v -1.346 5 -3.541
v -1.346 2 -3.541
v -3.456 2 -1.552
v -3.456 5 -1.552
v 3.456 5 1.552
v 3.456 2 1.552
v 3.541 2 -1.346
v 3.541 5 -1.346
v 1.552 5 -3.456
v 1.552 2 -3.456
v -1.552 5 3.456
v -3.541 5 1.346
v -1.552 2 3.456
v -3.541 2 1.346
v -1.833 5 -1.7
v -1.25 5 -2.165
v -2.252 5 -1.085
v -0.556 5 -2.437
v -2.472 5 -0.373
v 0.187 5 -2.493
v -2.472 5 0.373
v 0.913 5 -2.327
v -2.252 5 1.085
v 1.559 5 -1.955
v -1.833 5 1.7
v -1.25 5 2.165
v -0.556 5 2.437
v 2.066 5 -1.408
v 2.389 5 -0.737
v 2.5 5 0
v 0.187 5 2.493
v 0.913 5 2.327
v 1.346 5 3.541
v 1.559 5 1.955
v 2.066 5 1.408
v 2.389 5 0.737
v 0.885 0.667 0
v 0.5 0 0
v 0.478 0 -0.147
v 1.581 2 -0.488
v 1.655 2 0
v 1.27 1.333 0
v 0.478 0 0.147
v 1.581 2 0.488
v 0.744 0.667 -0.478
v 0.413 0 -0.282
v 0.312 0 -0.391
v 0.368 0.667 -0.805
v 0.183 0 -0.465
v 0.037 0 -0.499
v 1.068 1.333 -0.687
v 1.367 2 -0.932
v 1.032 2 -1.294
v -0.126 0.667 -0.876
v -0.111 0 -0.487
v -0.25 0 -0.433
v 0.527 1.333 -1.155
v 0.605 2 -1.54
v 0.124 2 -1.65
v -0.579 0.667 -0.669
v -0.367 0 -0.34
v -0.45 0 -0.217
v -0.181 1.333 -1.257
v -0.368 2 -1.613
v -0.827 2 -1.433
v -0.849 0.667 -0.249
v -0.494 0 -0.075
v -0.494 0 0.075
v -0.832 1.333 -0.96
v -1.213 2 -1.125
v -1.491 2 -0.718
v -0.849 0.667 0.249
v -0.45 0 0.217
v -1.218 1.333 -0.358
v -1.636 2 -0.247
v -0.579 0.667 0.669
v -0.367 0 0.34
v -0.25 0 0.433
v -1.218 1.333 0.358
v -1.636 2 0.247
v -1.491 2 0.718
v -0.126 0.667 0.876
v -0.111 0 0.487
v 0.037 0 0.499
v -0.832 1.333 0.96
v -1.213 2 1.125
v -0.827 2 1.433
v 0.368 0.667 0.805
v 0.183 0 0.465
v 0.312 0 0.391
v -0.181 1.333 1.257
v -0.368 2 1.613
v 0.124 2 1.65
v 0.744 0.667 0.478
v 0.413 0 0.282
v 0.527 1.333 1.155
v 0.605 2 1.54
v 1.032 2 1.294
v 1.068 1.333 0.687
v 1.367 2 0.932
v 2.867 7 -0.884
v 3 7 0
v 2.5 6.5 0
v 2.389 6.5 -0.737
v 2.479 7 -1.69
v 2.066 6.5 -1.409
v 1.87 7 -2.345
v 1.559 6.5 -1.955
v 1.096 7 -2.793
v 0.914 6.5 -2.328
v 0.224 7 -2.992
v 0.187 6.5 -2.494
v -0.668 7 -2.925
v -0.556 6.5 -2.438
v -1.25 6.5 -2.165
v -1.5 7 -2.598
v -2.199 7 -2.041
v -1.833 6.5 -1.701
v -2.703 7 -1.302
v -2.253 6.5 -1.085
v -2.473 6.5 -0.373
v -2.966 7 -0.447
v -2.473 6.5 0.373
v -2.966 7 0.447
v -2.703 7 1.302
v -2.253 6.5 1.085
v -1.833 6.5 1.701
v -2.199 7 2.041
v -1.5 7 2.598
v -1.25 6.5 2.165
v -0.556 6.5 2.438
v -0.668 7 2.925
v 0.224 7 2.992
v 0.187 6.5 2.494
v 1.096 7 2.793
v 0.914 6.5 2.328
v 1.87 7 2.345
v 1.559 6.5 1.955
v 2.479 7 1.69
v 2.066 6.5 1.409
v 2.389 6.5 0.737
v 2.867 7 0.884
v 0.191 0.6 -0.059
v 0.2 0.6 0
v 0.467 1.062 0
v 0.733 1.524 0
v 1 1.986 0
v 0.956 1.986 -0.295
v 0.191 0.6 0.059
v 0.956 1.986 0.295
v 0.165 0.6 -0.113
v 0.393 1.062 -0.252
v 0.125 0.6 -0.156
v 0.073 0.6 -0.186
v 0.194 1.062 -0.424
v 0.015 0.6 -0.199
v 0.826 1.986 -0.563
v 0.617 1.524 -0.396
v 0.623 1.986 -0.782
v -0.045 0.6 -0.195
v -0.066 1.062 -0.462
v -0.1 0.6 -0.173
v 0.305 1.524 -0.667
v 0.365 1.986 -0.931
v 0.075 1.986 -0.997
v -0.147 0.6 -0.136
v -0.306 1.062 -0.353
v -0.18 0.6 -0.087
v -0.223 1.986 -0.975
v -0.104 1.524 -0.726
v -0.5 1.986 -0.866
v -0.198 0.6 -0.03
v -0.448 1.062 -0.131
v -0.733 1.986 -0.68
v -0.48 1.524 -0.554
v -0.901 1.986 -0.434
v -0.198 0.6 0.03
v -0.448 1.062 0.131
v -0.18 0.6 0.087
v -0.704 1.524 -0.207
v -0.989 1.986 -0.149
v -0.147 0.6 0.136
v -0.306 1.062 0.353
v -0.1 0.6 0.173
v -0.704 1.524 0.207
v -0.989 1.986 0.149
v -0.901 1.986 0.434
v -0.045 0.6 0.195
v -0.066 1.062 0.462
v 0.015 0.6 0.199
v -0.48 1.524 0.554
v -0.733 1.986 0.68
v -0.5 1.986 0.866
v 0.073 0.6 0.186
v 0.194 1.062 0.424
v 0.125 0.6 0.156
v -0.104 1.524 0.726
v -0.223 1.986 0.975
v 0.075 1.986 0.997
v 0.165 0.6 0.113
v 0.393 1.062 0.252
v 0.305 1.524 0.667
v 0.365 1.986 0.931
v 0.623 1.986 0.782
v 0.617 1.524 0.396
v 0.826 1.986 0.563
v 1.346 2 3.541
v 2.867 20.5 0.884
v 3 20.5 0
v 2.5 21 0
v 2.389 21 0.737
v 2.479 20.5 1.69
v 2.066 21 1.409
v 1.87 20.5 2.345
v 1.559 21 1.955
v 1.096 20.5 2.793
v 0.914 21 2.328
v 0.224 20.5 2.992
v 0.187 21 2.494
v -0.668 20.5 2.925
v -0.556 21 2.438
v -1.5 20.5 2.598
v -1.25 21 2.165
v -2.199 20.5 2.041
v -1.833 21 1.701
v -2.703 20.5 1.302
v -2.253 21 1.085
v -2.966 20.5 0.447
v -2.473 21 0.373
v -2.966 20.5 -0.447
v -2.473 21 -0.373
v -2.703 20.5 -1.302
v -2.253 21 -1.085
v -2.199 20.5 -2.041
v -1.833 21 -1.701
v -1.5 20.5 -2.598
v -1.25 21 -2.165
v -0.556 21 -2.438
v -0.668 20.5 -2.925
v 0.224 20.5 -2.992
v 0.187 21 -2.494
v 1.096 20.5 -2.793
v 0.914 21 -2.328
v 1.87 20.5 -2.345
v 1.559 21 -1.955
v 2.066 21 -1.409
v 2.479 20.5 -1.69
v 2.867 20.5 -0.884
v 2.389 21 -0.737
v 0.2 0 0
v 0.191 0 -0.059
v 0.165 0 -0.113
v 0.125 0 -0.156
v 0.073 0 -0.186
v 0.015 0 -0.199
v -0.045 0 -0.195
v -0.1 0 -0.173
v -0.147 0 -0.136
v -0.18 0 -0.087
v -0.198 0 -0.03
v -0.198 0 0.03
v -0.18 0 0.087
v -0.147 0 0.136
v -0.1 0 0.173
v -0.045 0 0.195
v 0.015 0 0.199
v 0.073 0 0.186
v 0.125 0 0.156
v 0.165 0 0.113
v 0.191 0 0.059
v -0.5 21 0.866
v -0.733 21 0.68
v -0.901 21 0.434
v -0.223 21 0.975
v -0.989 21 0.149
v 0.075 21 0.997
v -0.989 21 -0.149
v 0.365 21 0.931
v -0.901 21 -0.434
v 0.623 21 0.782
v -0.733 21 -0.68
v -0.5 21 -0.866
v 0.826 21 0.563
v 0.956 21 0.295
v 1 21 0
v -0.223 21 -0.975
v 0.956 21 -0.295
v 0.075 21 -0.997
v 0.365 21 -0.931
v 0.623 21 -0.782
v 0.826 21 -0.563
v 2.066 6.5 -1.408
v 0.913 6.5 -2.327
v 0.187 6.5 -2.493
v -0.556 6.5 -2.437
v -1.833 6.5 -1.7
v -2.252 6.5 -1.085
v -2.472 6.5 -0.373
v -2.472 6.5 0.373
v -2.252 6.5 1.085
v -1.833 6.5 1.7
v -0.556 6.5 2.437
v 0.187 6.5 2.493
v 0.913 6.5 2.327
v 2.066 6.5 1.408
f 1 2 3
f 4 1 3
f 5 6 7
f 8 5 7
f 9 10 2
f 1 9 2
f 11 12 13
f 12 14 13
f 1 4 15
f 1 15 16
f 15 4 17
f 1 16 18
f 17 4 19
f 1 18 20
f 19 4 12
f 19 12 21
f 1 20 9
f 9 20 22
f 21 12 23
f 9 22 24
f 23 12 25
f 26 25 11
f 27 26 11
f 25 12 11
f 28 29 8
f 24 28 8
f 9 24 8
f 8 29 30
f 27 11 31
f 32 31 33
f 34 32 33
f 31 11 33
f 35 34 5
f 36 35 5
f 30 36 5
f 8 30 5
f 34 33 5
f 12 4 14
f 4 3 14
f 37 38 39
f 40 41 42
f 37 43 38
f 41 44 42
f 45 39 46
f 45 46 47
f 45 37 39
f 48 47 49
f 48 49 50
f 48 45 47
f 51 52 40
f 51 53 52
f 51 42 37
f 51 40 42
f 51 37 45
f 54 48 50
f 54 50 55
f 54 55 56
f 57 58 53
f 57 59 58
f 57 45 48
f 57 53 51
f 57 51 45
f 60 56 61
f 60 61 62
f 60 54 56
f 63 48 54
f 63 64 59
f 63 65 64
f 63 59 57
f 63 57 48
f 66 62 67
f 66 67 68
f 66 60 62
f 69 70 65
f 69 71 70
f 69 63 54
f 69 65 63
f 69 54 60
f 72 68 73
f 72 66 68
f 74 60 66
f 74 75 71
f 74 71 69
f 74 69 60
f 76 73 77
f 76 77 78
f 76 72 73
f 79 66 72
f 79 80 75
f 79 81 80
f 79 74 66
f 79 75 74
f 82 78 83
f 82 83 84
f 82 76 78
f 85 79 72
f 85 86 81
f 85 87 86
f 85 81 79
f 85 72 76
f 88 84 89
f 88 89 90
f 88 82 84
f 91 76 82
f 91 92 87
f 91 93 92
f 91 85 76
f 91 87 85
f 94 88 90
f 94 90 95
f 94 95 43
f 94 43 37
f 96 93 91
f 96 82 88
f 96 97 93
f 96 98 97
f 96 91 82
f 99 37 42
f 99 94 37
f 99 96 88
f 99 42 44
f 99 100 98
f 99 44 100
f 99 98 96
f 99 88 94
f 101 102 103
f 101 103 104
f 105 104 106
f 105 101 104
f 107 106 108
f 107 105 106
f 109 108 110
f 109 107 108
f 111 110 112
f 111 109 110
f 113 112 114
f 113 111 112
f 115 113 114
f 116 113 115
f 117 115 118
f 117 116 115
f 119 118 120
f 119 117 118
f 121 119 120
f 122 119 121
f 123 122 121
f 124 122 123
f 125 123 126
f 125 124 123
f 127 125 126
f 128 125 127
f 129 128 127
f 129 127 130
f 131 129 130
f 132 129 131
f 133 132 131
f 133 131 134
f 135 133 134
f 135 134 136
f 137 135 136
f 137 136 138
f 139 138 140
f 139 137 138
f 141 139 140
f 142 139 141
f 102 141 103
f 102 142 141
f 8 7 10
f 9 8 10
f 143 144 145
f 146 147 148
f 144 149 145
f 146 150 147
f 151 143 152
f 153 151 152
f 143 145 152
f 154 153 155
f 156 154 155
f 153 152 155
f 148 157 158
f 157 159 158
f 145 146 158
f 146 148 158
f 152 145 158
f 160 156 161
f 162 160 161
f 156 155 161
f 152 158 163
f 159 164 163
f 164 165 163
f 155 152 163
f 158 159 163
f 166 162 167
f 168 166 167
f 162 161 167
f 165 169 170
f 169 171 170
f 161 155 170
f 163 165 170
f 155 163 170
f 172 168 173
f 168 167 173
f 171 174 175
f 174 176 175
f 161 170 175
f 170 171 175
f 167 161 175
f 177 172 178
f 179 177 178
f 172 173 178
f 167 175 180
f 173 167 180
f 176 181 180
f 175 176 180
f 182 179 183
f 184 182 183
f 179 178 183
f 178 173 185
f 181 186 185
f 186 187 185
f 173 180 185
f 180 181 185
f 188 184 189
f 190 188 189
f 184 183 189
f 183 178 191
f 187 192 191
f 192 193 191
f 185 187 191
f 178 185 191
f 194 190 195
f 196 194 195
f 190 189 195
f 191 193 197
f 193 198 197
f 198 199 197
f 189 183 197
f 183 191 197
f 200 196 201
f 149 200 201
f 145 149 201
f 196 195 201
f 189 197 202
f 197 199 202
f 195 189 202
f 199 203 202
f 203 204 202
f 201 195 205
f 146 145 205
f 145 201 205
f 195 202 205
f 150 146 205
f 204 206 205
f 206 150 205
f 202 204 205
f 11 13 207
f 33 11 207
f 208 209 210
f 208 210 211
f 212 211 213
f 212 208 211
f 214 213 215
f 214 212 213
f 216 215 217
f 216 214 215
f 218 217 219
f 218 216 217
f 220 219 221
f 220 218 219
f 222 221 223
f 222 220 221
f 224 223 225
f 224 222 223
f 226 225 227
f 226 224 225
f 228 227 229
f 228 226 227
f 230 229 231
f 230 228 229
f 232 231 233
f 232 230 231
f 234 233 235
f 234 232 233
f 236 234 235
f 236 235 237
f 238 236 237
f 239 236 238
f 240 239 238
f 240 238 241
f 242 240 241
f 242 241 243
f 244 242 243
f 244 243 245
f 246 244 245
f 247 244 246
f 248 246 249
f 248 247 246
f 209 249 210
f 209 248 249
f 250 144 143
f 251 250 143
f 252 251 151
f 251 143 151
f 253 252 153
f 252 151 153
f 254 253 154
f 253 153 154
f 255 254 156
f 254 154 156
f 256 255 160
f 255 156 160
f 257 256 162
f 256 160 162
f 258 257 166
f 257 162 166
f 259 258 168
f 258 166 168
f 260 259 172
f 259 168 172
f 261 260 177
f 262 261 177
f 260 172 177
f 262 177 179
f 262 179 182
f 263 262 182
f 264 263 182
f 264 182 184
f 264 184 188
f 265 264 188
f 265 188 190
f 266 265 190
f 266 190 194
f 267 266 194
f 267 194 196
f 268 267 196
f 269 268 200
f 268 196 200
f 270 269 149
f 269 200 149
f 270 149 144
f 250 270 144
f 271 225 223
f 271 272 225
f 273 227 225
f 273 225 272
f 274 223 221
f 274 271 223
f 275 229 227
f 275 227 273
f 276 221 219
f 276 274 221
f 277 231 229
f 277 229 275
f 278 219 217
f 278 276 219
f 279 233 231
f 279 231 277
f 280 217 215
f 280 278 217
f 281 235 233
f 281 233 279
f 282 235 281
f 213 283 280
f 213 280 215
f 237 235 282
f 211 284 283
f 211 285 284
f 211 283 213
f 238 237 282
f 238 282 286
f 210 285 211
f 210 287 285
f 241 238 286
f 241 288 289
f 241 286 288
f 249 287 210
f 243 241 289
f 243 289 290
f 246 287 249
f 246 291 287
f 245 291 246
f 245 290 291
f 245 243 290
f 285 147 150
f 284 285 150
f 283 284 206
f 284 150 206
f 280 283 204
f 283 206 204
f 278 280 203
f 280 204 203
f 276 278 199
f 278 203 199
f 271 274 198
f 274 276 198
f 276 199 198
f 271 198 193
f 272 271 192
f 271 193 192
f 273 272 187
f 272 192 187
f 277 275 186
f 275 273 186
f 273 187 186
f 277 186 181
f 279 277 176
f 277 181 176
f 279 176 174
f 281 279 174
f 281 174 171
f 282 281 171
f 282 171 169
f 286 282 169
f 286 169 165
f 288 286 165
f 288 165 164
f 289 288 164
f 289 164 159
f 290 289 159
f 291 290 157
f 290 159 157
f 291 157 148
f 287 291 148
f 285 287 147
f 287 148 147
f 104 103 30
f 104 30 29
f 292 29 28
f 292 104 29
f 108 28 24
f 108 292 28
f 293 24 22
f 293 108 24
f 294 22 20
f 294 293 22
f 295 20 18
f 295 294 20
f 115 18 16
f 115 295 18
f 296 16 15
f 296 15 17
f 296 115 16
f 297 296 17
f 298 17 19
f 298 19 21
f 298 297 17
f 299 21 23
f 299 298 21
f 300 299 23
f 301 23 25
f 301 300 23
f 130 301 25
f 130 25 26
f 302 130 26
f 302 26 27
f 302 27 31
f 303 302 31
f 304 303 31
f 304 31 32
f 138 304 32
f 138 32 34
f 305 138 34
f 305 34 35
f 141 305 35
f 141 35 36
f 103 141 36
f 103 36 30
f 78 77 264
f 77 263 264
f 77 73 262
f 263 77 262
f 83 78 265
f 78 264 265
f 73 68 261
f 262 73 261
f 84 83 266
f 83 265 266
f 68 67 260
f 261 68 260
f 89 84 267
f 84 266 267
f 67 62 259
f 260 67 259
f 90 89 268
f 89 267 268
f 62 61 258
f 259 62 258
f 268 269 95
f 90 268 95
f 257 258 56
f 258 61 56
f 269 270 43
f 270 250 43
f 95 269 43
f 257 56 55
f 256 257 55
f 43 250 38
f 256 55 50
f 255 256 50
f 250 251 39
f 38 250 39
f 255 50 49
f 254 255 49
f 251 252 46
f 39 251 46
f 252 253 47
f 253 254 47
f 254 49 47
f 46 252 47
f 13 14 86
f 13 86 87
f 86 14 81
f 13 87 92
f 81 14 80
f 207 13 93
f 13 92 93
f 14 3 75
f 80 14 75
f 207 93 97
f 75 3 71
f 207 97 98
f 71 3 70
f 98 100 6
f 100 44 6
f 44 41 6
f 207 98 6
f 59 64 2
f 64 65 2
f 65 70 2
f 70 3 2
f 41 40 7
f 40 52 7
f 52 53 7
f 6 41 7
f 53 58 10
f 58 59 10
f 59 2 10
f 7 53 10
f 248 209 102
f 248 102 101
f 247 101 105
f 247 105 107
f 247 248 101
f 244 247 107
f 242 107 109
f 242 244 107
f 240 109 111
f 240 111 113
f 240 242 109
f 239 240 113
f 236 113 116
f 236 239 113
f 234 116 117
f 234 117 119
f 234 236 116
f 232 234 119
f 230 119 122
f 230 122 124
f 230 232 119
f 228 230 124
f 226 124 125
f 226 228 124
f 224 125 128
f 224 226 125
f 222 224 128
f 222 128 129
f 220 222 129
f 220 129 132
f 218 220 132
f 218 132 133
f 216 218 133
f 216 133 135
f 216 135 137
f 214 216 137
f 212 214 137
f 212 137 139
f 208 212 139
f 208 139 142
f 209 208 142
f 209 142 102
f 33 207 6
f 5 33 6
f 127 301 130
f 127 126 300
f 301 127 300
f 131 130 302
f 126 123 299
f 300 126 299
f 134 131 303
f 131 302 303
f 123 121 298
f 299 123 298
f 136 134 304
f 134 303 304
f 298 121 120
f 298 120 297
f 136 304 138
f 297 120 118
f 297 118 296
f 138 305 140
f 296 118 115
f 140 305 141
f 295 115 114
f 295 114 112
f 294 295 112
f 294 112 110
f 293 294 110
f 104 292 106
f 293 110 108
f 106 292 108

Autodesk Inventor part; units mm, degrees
ref_plane "YZ Plane" through (0, 0, 0) normal (1, 0, 0) x (0, 1, 0)
ref_plane "XZ Plane" through (0, 0, 0) normal (0, 1, 0) x (-1, 0, 0)
ref_plane "XY Plane" through (0, 0, 0) normal (0, 0, 1) x (1, 0, 0)
sketch "Skizze1" plane through (0, 0, 0) normal (0, 0, 1) x (1, 0, 0)
  line L0 (0.2, 0) -> (0.5, 0)
  line L1 (0.2, 0) -> (0.5, 0) construction
  line L2 (0.5, 0) -> (1.6547, 2)
  line L3 (1.6547, 2) -> (3.5, 2)
  line L4 (3.5, 2) -> (3.5, 5)
  line L5 (3.5, 5) -> (2.5, 5)
  line L6 (2.5, 5) -> (2.5, 6.5)
  line L7 (2.5, 6.5) -> (3, 6.5)
  line L8 (3, 6.5) -> (3, 21)
  line L9 (3, 21) -> (1, 21)
  line L10 (1, 21) -> (1, 1.9856)
  line L11 (0.2, 0) -> (0.2, 0.6)
  line L12 (0.2, 0.6) -> (1, 1.9856)
  line L13 (0, -4.2) -> (0, 25.2) projected
  point P0 (0, 0)
  dimension "d4" = 90
  dimension "d6" = 1
  dimension "d7" = 0.2
  dimension "d8" = 0
  dimension "d9" = 0.5
  dimension "d10" = 19
  dimension "d11" = 16
  dimension "d12" = 14.5
  dimension "d13" = 2.5
  dimension "d15" = 21
  dimension "d16" = 0.6
  dimension "d17" = 3.5
  dimension "d18" = 150
  dimension "d19" = 3
revolve "Umdrehung1" add sketch "Skizze1" angle 360 about axis through (0, -10, 0) along (0, 1, 0)
sketch "Skizze2" plane through (0, 2, 0) normal (0, -1, 0) x (1, 0, 0)
  circle A0 centre (0, 0) radius 0.2 projected
  line L0 (3.5412, -1.346) -> (1.5522, -3.4558)
  line L1 (1.5522, -3.4558) -> (-1.346, -3.5412)
  line L2 (-1.346, -3.5412) -> (-3.4558, -1.5522)
  line L3 (-3.4558, -1.5522) -> (-3.5412, 1.346)
  line L4 (-3.5412, 1.346) -> (-1.5522, 3.4558)
  line L5 (-1.5522, 3.4558) -> (1.346, 3.5412)
  line L6 (1.346, 3.5412) -> (3.4558, 1.5522)
  line L7 (3.4558, 1.5522) -> (3.5412, -1.346)
  circle A1 centre (0, 0) radius 1.6547
  dimension "d21" = 7
extrude "Extrusion2" add sketch "Skizze2" against normal up to surface (3 mm away) contours L0 L1 L2 L3 L4 L5 L6 L7
thread "Gewinde1" size "M6x1" class "6g" standard "ANSI Metric M Profile" full length
chamfer "Fase1" distance 0.5 angle 45 2 edges at (-3, 6.5, 0) (-3, 21, 0)
properties part number "E3D-v6 Volcano Nozzle" material "Messing, weicher Gelbton"
